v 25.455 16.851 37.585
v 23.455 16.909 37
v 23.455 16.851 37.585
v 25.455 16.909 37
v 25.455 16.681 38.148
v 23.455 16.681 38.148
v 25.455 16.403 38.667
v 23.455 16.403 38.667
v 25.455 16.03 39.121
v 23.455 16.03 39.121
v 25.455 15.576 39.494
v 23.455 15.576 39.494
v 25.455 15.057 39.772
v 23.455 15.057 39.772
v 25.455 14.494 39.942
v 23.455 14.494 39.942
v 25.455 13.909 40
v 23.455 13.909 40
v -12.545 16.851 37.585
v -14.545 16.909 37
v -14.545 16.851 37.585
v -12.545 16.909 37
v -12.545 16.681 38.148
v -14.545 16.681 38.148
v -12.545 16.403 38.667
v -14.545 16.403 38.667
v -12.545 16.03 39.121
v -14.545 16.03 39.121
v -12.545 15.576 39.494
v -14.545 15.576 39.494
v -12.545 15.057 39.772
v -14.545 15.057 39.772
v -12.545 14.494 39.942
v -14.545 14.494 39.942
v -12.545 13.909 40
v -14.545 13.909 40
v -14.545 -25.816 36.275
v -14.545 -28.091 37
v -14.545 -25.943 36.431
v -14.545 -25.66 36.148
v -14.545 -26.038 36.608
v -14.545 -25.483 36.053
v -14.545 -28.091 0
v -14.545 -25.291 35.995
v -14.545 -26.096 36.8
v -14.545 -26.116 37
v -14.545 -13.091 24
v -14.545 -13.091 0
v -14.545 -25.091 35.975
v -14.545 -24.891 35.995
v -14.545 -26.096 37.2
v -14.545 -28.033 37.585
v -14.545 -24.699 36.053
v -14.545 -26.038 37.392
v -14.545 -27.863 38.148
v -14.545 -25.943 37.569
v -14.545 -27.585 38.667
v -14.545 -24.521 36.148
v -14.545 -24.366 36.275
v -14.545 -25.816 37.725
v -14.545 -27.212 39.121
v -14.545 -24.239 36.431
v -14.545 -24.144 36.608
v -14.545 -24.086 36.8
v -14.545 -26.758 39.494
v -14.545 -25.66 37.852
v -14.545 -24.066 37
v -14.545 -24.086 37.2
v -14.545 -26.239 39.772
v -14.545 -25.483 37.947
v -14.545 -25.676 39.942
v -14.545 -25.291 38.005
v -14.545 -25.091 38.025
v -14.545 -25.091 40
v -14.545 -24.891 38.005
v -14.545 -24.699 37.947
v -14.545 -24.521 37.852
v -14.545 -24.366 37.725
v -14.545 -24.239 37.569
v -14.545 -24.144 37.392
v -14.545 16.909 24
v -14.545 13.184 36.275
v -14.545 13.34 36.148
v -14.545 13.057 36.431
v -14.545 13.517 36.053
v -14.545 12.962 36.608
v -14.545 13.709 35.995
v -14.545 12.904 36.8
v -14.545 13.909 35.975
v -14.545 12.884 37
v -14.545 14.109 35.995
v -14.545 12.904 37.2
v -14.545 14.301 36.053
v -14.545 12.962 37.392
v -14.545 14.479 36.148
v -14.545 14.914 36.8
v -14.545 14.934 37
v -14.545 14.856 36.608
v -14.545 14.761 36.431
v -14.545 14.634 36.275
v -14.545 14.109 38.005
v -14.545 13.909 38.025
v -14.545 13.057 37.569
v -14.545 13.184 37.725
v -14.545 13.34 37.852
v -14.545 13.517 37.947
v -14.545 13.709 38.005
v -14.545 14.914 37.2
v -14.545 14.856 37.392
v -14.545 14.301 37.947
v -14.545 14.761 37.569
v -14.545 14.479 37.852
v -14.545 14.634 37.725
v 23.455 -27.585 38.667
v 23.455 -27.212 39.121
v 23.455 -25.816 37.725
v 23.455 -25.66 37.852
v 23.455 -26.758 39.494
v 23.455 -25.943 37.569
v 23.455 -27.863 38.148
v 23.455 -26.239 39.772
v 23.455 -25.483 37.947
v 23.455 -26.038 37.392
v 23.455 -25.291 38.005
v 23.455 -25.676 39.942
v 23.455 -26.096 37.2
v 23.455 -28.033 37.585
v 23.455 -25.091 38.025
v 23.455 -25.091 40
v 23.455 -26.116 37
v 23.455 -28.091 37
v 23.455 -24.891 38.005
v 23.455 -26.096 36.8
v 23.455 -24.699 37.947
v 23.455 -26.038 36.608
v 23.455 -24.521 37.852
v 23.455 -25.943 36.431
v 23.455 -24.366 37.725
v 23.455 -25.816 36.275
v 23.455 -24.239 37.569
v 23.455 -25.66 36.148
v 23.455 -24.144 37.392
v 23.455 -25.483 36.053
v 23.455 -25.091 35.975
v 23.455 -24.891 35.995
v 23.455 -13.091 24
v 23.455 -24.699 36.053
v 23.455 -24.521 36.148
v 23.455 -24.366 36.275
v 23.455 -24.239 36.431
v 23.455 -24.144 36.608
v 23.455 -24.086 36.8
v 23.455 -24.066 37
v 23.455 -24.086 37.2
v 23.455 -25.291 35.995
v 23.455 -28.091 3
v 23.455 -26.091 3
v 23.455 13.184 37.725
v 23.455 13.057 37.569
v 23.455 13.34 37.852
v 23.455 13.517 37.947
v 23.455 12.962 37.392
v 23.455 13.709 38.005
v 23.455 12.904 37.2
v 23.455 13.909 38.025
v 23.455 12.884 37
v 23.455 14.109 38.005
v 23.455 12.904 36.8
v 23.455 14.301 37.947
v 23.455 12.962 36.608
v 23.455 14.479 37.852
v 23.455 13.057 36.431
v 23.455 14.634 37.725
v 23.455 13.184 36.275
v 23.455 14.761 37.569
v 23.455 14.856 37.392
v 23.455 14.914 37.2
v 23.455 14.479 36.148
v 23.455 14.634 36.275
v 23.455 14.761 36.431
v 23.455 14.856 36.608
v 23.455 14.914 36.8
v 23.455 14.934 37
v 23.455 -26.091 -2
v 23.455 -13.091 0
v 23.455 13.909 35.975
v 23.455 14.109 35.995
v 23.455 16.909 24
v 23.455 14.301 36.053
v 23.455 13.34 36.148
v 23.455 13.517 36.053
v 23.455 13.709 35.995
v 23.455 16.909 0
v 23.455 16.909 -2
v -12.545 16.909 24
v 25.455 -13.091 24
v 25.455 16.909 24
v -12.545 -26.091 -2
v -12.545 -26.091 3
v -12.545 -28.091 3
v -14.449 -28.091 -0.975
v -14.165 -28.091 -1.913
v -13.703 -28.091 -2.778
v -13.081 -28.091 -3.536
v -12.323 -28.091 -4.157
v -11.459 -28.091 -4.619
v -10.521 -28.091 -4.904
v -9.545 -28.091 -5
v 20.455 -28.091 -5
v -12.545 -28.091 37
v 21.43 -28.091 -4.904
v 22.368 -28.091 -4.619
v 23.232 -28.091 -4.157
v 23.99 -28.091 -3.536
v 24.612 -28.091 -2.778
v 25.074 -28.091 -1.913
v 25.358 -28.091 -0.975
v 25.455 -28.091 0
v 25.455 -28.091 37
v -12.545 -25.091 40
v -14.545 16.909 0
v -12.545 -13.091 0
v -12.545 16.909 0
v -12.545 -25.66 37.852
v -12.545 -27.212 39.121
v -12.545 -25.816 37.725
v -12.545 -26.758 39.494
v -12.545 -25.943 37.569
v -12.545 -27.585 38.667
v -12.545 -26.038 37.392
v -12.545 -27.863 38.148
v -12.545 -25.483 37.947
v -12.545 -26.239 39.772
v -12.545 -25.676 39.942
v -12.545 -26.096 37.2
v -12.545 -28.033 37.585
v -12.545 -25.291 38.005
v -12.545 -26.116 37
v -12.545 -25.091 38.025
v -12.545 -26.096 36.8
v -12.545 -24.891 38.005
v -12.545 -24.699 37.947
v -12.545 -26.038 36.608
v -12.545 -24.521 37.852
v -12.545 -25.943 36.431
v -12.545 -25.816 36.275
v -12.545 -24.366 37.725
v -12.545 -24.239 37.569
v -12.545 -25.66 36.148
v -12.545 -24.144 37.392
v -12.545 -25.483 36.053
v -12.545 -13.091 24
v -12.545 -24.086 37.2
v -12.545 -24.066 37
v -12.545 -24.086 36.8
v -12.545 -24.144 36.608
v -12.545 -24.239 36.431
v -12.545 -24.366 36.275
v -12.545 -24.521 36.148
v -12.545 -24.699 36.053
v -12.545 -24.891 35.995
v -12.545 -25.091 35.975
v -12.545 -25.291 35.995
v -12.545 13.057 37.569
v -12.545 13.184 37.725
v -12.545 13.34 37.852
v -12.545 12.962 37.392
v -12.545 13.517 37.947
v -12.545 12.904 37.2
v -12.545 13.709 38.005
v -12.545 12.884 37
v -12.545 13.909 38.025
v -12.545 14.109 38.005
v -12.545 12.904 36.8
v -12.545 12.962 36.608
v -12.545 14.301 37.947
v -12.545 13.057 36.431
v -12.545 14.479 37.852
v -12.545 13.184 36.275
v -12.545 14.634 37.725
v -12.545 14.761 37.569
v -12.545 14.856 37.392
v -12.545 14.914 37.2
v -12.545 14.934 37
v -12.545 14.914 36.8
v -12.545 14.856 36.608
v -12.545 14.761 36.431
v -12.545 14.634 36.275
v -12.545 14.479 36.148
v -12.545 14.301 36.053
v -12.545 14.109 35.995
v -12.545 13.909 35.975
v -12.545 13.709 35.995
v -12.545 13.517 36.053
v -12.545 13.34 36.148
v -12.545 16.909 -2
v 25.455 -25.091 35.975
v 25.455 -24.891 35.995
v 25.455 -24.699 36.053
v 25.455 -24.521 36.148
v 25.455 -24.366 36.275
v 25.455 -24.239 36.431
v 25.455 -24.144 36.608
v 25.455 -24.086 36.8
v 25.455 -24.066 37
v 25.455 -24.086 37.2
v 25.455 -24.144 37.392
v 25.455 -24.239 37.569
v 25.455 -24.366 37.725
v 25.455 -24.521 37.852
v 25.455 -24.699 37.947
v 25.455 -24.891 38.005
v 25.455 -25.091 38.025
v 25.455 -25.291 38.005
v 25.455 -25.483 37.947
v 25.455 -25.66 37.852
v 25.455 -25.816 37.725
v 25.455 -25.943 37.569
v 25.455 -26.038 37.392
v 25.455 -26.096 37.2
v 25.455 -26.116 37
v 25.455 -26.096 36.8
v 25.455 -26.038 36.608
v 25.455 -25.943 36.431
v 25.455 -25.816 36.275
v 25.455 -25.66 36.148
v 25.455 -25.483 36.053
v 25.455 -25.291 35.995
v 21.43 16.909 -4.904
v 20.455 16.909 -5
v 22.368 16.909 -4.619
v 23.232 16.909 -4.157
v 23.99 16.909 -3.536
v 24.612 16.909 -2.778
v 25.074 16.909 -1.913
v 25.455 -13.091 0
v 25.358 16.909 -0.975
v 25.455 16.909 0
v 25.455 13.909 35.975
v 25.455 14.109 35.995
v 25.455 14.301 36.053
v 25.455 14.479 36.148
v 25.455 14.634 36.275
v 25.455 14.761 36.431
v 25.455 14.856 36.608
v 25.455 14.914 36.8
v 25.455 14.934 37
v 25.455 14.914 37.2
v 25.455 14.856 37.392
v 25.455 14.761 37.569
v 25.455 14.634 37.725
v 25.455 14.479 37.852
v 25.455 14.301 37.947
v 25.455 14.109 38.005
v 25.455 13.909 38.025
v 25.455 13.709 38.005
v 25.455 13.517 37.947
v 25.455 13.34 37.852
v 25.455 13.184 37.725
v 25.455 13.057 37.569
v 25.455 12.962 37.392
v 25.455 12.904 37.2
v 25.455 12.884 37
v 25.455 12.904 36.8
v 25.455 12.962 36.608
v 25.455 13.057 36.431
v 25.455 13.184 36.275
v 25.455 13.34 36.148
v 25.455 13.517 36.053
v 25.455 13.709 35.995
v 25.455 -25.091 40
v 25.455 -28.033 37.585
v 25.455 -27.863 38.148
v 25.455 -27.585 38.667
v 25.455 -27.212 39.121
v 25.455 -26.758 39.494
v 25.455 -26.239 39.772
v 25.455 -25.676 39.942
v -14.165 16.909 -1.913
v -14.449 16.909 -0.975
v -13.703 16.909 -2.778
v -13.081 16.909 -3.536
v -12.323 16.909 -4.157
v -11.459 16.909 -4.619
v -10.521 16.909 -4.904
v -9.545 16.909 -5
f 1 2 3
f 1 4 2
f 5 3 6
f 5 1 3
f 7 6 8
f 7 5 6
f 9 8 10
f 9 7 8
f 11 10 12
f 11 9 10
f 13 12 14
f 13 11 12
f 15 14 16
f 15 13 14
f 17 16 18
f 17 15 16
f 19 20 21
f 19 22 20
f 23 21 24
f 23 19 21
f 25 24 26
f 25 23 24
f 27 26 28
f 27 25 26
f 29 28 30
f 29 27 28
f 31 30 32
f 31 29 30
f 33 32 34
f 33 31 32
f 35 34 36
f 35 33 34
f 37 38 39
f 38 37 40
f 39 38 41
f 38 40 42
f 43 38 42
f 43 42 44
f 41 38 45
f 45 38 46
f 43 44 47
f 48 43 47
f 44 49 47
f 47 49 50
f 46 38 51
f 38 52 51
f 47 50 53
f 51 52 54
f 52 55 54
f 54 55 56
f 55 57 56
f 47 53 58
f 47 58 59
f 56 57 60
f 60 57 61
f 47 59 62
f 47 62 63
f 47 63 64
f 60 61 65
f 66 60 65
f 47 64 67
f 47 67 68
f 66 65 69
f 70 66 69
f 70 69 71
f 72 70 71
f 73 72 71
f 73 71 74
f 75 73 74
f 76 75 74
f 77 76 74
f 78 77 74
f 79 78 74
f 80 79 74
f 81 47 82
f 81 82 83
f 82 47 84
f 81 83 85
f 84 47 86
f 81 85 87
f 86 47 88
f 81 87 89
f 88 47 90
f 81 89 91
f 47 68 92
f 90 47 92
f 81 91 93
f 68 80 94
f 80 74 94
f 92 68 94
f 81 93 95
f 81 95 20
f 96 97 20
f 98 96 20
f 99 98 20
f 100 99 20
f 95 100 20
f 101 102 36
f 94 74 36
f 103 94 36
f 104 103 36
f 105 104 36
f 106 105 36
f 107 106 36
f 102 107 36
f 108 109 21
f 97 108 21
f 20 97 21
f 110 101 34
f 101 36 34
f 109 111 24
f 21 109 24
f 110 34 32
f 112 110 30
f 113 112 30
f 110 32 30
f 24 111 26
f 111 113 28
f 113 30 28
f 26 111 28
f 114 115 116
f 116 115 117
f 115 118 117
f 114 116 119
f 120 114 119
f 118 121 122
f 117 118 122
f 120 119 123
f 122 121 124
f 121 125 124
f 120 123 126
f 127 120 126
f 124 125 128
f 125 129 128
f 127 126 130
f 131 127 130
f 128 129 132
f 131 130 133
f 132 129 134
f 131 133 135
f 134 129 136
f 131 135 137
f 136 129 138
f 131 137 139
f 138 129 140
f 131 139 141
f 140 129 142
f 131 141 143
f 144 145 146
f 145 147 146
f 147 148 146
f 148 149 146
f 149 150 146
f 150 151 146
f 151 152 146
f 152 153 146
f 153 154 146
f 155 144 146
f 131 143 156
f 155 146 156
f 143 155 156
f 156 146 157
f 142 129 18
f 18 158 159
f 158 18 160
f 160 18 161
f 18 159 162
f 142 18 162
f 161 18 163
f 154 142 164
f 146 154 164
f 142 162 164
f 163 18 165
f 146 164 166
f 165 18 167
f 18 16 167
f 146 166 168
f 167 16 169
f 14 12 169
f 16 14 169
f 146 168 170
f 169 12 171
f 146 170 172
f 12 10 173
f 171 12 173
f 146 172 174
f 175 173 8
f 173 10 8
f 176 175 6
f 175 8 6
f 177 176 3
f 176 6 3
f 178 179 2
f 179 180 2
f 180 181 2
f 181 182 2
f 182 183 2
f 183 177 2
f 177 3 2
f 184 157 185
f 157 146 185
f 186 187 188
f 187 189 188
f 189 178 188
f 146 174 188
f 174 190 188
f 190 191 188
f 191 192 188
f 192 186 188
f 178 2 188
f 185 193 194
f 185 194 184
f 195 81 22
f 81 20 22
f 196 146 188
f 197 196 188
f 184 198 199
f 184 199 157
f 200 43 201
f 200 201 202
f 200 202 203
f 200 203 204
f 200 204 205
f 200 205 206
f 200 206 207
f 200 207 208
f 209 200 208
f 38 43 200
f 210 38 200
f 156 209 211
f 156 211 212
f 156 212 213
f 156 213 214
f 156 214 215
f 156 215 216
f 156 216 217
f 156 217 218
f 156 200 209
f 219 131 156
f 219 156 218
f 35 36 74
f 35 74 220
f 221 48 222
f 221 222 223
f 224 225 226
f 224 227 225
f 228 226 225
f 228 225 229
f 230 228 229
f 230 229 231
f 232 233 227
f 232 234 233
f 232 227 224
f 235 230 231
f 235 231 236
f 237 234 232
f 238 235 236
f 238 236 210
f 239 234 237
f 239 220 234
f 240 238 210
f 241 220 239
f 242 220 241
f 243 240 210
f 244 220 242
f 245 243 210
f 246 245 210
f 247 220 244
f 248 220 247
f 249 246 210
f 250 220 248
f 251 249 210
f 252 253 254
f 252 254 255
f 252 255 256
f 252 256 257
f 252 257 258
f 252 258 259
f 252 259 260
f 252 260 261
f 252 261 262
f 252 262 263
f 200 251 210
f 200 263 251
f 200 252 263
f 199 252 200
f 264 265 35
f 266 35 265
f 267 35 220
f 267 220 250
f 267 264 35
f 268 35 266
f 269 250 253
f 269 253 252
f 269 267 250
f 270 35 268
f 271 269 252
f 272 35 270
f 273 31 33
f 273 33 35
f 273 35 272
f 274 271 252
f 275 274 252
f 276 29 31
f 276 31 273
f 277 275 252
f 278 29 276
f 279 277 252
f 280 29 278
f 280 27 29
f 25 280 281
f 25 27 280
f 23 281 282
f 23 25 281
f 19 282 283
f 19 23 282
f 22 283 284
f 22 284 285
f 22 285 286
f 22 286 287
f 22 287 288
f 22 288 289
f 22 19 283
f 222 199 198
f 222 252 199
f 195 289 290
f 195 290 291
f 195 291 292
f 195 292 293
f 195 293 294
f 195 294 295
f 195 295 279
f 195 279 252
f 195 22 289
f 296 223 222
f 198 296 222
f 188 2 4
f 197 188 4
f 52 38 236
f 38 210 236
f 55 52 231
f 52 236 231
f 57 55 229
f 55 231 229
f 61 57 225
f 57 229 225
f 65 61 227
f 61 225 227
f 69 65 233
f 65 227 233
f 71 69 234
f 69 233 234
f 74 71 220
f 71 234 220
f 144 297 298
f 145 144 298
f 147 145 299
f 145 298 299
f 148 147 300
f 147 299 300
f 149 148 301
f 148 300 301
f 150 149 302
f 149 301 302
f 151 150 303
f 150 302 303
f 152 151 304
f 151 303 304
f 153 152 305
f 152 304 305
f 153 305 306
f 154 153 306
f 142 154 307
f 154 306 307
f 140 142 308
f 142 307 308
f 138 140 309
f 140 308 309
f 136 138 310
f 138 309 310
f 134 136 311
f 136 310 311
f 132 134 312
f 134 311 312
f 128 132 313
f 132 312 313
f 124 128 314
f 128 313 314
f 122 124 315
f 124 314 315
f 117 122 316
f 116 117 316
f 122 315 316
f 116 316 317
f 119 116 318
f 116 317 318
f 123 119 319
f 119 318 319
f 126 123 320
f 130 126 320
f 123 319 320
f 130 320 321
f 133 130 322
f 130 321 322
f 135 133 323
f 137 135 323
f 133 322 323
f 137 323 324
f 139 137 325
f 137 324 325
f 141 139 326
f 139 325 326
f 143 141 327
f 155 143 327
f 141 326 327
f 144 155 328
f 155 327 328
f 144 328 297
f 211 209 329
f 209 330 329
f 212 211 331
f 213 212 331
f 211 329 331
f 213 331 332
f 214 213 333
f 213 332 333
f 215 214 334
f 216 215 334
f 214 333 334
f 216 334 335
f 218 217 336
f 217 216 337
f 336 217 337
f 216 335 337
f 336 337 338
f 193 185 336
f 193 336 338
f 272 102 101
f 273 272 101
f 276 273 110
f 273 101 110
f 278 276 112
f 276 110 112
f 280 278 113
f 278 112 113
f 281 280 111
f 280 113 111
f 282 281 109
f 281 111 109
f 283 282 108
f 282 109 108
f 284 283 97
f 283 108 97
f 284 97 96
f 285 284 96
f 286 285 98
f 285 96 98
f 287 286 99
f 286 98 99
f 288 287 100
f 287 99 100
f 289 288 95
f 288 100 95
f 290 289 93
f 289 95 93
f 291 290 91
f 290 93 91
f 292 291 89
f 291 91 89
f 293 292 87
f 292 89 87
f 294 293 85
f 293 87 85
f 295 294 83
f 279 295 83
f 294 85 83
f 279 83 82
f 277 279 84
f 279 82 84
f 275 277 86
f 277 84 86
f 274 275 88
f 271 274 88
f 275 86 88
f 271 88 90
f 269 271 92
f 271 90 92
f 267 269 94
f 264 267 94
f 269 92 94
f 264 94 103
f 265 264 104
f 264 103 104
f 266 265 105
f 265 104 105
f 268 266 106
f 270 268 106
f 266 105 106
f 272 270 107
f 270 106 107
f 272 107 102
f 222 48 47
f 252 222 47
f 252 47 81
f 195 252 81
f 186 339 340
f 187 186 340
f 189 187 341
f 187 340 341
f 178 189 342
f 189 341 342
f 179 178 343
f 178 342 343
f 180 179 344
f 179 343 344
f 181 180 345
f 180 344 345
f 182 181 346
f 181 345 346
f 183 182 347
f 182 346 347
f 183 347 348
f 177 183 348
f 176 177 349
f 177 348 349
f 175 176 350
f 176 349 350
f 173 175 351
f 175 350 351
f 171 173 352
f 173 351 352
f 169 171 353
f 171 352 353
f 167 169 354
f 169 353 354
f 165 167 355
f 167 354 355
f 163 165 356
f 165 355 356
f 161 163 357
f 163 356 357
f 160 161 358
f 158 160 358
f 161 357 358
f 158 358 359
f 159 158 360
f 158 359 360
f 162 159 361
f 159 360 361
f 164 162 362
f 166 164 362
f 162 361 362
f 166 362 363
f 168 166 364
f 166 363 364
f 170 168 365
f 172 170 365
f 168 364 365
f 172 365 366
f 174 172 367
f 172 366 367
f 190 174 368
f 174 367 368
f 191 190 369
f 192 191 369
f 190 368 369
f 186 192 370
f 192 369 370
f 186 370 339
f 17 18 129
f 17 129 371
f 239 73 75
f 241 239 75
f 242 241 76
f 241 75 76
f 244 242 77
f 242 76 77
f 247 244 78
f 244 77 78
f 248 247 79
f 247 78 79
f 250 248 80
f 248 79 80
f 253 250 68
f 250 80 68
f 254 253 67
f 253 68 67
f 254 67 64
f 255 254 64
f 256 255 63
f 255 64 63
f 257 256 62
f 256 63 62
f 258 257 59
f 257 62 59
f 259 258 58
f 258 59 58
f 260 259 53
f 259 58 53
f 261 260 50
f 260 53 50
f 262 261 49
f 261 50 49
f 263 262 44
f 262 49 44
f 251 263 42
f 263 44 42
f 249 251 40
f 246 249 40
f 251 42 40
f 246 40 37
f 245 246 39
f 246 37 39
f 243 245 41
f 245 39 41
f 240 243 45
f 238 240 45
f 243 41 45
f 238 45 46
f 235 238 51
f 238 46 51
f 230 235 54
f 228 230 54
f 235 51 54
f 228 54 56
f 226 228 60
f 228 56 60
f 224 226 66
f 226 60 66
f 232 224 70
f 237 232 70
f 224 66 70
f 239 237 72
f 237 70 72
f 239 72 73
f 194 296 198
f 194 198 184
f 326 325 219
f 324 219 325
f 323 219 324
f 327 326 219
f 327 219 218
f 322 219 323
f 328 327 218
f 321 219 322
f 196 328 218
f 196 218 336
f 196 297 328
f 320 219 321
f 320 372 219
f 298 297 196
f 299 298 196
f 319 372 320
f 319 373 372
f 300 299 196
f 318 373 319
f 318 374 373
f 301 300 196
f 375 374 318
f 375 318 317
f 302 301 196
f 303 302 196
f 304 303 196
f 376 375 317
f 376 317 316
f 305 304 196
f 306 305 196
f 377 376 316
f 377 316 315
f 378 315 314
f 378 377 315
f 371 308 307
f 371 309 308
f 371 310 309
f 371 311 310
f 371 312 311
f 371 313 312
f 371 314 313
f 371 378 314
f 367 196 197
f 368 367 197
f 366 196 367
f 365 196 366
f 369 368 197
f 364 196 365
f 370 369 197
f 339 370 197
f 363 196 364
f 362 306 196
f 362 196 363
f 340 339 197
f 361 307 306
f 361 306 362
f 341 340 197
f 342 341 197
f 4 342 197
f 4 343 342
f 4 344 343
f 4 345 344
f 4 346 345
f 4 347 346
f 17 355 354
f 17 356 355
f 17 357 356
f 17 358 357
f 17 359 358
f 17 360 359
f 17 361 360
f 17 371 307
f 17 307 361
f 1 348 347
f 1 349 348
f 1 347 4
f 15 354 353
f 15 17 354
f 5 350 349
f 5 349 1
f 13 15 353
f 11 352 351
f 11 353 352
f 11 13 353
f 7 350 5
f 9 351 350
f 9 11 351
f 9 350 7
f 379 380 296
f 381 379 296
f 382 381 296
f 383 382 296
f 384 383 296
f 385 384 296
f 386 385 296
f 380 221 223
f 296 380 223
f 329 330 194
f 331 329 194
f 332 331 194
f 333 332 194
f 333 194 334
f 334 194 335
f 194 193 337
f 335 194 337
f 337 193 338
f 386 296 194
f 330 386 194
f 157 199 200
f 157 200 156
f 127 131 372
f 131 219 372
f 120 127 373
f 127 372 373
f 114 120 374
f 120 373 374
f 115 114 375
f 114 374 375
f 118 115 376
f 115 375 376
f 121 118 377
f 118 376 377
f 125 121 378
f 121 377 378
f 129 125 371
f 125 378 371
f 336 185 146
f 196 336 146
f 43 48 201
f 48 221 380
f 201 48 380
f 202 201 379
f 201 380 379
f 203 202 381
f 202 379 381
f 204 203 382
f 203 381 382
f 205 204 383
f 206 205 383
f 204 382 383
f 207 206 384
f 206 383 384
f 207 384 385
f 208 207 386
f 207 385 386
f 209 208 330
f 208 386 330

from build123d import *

# Parameters (mm, degrees)
SKETCH_1_W           = 40
SKETCH_1_H           = 45
EXTRUDE_1_DEPTH      = 40
EXTRUDE_1_DEPTH_BACK = 5
SKETCH_2_W           = 36
SKETCH_2_H           = 37
CUT_EXTRUDE_1_DEPTH  = 50
SKETCH_3_R           = 1.025
CUT_EXTRUDE_2_DEPTH  = 2
SKETCH_4_R           = 1.025
CUT_EXTRUDE_3_DEPTH  = 2
SKETCH_5_W           = 36
SKETCH_5_H           = 5
CUT_EXTRUDE_4_DEPTH  = 43
FILLET_6_R           = 5
FILLET_7_R           = 5
FILLET_12_R          = 3
FILLET_13_R          = 3
FILLET_14_R          = 3
FILLET_15_R          = 3
SKETCH_6_W           = 24
SKETCH_6_H           = 30
CUT_EXTRUDE_5_DEPTH  = 44


with BuildPart() as part:
    # 草圖1 → 填料-伸長1 (new body, two sides)
    with BuildSketch(Plane.XY) as extrude_1_sk:
        with Locations((5.454545455, -5.590909091)):
            Rectangle(SKETCH_1_W, SKETCH_1_H)
    extrude(amount=EXTRUDE_1_DEPTH)
    extrude(extrude_1_sk.sketch, amount=-EXTRUDE_1_DEPTH_BACK)

    # 草圖2 → 除料-伸長1 (cut)
    with BuildSketch(Plane(origin=(0, 16.909090909, 0), x_dir=(1, 0, 0), z_dir=(0, 1, 0))):
        with Locations((5.454545455, -21.5)):
            Rectangle(SKETCH_2_W, SKETCH_2_H)
    extrude(amount=-CUT_EXTRUDE_1_DEPTH, mode=Mode.SUBTRACT)

    # 草圖3 → 除料-伸長2 (cut)
    with BuildSketch(Plane.ZY.offset(14.545454545)):
        with Locations((37, -25.090909091)):
            Circle(SKETCH_3_R)
        with Locations((37, 13.909090909)):
            Circle(SKETCH_3_R)
    extrude(amount=-CUT_EXTRUDE_2_DEPTH, mode=Mode.SUBTRACT)

    # 草圖4 → 除料-伸長3 (cut)
    with BuildSketch(Plane(origin=(25.454545455, 0, 0), x_dir=(0, 0, -1), z_dir=(1, 0, 0))):
        with Locations((-37, 13.909090909)):
            Circle(SKETCH_4_R)
        with Locations((-37, -25.090909091)):
            Circle(SKETCH_4_R)
    extrude(amount=-CUT_EXTRUDE_3_DEPTH, mode=Mode.SUBTRACT)

    # 草圖5 → 除料-伸長4 (cut)
    with BuildSketch(Plane(origin=(0, 16.909090909, 0), x_dir=(1, 0, 0), z_dir=(0, 1, 0))):
        with Locations((5.454545455, -0.5)):
            Rectangle(SKETCH_5_W, SKETCH_5_H)
    extrude(amount=-CUT_EXTRUDE_4_DEPTH, mode=Mode.SUBTRACT)

    # 圓角6
    fillet_6_edges = [part.edges().sort_by_distance(p)[0] for p in [
        (-14.545454545, -5.590909091, -5),
    ]]
    fillet(fillet_6_edges, radius=FILLET_6_R)

    # 圓角7
    fillet_7_edges = [part.edges().sort_by_distance(p)[0] for p in [
        (25.454545455, -5.590909091, -5),
    ]]
    fillet(fillet_7_edges, radius=FILLET_7_R)

    # 圓角12
    fillet_12_edges = [part.edges().sort_by_distance(p)[0] for p in [
        (-13.545454545, -28.090909091, 40),
    ]]
    fillet(fillet_12_edges, radius=FILLET_12_R)

    # 圓角13
    fillet_13_edges = [part.edges().sort_by_distance(p)[0] for p in [
        (24.454545455, -28.090909091, 40),
    ]]
    fillet(fillet_13_edges, radius=FILLET_13_R)

    # 圓角14
    fillet_14_edges = [part.edges().sort_by_distance(p)[0] for p in [
        (-13.545454545, 16.909090909, 40),
    ]]
    fillet(fillet_14_edges, radius=FILLET_14_R)

    # 圓角15
    fillet_15_edges = [part.edges().sort_by_distance(p)[0] for p in [
        (24.454545455, 16.909090909, 40),
    ]]
    fillet(fillet_15_edges, radius=FILLET_15_R)

    # 草圖6 → 除料-伸長5 (cut)
    with BuildSketch(Plane.ZY.offset(14.545454545)):
        with Locations((12, 1.909090909)):
            Rectangle(SKETCH_6_W, SKETCH_6_H)
    extrude(amount=-CUT_EXTRUDE_5_DEPTH, mode=Mode.SUBTRACT)


solid = part.part
